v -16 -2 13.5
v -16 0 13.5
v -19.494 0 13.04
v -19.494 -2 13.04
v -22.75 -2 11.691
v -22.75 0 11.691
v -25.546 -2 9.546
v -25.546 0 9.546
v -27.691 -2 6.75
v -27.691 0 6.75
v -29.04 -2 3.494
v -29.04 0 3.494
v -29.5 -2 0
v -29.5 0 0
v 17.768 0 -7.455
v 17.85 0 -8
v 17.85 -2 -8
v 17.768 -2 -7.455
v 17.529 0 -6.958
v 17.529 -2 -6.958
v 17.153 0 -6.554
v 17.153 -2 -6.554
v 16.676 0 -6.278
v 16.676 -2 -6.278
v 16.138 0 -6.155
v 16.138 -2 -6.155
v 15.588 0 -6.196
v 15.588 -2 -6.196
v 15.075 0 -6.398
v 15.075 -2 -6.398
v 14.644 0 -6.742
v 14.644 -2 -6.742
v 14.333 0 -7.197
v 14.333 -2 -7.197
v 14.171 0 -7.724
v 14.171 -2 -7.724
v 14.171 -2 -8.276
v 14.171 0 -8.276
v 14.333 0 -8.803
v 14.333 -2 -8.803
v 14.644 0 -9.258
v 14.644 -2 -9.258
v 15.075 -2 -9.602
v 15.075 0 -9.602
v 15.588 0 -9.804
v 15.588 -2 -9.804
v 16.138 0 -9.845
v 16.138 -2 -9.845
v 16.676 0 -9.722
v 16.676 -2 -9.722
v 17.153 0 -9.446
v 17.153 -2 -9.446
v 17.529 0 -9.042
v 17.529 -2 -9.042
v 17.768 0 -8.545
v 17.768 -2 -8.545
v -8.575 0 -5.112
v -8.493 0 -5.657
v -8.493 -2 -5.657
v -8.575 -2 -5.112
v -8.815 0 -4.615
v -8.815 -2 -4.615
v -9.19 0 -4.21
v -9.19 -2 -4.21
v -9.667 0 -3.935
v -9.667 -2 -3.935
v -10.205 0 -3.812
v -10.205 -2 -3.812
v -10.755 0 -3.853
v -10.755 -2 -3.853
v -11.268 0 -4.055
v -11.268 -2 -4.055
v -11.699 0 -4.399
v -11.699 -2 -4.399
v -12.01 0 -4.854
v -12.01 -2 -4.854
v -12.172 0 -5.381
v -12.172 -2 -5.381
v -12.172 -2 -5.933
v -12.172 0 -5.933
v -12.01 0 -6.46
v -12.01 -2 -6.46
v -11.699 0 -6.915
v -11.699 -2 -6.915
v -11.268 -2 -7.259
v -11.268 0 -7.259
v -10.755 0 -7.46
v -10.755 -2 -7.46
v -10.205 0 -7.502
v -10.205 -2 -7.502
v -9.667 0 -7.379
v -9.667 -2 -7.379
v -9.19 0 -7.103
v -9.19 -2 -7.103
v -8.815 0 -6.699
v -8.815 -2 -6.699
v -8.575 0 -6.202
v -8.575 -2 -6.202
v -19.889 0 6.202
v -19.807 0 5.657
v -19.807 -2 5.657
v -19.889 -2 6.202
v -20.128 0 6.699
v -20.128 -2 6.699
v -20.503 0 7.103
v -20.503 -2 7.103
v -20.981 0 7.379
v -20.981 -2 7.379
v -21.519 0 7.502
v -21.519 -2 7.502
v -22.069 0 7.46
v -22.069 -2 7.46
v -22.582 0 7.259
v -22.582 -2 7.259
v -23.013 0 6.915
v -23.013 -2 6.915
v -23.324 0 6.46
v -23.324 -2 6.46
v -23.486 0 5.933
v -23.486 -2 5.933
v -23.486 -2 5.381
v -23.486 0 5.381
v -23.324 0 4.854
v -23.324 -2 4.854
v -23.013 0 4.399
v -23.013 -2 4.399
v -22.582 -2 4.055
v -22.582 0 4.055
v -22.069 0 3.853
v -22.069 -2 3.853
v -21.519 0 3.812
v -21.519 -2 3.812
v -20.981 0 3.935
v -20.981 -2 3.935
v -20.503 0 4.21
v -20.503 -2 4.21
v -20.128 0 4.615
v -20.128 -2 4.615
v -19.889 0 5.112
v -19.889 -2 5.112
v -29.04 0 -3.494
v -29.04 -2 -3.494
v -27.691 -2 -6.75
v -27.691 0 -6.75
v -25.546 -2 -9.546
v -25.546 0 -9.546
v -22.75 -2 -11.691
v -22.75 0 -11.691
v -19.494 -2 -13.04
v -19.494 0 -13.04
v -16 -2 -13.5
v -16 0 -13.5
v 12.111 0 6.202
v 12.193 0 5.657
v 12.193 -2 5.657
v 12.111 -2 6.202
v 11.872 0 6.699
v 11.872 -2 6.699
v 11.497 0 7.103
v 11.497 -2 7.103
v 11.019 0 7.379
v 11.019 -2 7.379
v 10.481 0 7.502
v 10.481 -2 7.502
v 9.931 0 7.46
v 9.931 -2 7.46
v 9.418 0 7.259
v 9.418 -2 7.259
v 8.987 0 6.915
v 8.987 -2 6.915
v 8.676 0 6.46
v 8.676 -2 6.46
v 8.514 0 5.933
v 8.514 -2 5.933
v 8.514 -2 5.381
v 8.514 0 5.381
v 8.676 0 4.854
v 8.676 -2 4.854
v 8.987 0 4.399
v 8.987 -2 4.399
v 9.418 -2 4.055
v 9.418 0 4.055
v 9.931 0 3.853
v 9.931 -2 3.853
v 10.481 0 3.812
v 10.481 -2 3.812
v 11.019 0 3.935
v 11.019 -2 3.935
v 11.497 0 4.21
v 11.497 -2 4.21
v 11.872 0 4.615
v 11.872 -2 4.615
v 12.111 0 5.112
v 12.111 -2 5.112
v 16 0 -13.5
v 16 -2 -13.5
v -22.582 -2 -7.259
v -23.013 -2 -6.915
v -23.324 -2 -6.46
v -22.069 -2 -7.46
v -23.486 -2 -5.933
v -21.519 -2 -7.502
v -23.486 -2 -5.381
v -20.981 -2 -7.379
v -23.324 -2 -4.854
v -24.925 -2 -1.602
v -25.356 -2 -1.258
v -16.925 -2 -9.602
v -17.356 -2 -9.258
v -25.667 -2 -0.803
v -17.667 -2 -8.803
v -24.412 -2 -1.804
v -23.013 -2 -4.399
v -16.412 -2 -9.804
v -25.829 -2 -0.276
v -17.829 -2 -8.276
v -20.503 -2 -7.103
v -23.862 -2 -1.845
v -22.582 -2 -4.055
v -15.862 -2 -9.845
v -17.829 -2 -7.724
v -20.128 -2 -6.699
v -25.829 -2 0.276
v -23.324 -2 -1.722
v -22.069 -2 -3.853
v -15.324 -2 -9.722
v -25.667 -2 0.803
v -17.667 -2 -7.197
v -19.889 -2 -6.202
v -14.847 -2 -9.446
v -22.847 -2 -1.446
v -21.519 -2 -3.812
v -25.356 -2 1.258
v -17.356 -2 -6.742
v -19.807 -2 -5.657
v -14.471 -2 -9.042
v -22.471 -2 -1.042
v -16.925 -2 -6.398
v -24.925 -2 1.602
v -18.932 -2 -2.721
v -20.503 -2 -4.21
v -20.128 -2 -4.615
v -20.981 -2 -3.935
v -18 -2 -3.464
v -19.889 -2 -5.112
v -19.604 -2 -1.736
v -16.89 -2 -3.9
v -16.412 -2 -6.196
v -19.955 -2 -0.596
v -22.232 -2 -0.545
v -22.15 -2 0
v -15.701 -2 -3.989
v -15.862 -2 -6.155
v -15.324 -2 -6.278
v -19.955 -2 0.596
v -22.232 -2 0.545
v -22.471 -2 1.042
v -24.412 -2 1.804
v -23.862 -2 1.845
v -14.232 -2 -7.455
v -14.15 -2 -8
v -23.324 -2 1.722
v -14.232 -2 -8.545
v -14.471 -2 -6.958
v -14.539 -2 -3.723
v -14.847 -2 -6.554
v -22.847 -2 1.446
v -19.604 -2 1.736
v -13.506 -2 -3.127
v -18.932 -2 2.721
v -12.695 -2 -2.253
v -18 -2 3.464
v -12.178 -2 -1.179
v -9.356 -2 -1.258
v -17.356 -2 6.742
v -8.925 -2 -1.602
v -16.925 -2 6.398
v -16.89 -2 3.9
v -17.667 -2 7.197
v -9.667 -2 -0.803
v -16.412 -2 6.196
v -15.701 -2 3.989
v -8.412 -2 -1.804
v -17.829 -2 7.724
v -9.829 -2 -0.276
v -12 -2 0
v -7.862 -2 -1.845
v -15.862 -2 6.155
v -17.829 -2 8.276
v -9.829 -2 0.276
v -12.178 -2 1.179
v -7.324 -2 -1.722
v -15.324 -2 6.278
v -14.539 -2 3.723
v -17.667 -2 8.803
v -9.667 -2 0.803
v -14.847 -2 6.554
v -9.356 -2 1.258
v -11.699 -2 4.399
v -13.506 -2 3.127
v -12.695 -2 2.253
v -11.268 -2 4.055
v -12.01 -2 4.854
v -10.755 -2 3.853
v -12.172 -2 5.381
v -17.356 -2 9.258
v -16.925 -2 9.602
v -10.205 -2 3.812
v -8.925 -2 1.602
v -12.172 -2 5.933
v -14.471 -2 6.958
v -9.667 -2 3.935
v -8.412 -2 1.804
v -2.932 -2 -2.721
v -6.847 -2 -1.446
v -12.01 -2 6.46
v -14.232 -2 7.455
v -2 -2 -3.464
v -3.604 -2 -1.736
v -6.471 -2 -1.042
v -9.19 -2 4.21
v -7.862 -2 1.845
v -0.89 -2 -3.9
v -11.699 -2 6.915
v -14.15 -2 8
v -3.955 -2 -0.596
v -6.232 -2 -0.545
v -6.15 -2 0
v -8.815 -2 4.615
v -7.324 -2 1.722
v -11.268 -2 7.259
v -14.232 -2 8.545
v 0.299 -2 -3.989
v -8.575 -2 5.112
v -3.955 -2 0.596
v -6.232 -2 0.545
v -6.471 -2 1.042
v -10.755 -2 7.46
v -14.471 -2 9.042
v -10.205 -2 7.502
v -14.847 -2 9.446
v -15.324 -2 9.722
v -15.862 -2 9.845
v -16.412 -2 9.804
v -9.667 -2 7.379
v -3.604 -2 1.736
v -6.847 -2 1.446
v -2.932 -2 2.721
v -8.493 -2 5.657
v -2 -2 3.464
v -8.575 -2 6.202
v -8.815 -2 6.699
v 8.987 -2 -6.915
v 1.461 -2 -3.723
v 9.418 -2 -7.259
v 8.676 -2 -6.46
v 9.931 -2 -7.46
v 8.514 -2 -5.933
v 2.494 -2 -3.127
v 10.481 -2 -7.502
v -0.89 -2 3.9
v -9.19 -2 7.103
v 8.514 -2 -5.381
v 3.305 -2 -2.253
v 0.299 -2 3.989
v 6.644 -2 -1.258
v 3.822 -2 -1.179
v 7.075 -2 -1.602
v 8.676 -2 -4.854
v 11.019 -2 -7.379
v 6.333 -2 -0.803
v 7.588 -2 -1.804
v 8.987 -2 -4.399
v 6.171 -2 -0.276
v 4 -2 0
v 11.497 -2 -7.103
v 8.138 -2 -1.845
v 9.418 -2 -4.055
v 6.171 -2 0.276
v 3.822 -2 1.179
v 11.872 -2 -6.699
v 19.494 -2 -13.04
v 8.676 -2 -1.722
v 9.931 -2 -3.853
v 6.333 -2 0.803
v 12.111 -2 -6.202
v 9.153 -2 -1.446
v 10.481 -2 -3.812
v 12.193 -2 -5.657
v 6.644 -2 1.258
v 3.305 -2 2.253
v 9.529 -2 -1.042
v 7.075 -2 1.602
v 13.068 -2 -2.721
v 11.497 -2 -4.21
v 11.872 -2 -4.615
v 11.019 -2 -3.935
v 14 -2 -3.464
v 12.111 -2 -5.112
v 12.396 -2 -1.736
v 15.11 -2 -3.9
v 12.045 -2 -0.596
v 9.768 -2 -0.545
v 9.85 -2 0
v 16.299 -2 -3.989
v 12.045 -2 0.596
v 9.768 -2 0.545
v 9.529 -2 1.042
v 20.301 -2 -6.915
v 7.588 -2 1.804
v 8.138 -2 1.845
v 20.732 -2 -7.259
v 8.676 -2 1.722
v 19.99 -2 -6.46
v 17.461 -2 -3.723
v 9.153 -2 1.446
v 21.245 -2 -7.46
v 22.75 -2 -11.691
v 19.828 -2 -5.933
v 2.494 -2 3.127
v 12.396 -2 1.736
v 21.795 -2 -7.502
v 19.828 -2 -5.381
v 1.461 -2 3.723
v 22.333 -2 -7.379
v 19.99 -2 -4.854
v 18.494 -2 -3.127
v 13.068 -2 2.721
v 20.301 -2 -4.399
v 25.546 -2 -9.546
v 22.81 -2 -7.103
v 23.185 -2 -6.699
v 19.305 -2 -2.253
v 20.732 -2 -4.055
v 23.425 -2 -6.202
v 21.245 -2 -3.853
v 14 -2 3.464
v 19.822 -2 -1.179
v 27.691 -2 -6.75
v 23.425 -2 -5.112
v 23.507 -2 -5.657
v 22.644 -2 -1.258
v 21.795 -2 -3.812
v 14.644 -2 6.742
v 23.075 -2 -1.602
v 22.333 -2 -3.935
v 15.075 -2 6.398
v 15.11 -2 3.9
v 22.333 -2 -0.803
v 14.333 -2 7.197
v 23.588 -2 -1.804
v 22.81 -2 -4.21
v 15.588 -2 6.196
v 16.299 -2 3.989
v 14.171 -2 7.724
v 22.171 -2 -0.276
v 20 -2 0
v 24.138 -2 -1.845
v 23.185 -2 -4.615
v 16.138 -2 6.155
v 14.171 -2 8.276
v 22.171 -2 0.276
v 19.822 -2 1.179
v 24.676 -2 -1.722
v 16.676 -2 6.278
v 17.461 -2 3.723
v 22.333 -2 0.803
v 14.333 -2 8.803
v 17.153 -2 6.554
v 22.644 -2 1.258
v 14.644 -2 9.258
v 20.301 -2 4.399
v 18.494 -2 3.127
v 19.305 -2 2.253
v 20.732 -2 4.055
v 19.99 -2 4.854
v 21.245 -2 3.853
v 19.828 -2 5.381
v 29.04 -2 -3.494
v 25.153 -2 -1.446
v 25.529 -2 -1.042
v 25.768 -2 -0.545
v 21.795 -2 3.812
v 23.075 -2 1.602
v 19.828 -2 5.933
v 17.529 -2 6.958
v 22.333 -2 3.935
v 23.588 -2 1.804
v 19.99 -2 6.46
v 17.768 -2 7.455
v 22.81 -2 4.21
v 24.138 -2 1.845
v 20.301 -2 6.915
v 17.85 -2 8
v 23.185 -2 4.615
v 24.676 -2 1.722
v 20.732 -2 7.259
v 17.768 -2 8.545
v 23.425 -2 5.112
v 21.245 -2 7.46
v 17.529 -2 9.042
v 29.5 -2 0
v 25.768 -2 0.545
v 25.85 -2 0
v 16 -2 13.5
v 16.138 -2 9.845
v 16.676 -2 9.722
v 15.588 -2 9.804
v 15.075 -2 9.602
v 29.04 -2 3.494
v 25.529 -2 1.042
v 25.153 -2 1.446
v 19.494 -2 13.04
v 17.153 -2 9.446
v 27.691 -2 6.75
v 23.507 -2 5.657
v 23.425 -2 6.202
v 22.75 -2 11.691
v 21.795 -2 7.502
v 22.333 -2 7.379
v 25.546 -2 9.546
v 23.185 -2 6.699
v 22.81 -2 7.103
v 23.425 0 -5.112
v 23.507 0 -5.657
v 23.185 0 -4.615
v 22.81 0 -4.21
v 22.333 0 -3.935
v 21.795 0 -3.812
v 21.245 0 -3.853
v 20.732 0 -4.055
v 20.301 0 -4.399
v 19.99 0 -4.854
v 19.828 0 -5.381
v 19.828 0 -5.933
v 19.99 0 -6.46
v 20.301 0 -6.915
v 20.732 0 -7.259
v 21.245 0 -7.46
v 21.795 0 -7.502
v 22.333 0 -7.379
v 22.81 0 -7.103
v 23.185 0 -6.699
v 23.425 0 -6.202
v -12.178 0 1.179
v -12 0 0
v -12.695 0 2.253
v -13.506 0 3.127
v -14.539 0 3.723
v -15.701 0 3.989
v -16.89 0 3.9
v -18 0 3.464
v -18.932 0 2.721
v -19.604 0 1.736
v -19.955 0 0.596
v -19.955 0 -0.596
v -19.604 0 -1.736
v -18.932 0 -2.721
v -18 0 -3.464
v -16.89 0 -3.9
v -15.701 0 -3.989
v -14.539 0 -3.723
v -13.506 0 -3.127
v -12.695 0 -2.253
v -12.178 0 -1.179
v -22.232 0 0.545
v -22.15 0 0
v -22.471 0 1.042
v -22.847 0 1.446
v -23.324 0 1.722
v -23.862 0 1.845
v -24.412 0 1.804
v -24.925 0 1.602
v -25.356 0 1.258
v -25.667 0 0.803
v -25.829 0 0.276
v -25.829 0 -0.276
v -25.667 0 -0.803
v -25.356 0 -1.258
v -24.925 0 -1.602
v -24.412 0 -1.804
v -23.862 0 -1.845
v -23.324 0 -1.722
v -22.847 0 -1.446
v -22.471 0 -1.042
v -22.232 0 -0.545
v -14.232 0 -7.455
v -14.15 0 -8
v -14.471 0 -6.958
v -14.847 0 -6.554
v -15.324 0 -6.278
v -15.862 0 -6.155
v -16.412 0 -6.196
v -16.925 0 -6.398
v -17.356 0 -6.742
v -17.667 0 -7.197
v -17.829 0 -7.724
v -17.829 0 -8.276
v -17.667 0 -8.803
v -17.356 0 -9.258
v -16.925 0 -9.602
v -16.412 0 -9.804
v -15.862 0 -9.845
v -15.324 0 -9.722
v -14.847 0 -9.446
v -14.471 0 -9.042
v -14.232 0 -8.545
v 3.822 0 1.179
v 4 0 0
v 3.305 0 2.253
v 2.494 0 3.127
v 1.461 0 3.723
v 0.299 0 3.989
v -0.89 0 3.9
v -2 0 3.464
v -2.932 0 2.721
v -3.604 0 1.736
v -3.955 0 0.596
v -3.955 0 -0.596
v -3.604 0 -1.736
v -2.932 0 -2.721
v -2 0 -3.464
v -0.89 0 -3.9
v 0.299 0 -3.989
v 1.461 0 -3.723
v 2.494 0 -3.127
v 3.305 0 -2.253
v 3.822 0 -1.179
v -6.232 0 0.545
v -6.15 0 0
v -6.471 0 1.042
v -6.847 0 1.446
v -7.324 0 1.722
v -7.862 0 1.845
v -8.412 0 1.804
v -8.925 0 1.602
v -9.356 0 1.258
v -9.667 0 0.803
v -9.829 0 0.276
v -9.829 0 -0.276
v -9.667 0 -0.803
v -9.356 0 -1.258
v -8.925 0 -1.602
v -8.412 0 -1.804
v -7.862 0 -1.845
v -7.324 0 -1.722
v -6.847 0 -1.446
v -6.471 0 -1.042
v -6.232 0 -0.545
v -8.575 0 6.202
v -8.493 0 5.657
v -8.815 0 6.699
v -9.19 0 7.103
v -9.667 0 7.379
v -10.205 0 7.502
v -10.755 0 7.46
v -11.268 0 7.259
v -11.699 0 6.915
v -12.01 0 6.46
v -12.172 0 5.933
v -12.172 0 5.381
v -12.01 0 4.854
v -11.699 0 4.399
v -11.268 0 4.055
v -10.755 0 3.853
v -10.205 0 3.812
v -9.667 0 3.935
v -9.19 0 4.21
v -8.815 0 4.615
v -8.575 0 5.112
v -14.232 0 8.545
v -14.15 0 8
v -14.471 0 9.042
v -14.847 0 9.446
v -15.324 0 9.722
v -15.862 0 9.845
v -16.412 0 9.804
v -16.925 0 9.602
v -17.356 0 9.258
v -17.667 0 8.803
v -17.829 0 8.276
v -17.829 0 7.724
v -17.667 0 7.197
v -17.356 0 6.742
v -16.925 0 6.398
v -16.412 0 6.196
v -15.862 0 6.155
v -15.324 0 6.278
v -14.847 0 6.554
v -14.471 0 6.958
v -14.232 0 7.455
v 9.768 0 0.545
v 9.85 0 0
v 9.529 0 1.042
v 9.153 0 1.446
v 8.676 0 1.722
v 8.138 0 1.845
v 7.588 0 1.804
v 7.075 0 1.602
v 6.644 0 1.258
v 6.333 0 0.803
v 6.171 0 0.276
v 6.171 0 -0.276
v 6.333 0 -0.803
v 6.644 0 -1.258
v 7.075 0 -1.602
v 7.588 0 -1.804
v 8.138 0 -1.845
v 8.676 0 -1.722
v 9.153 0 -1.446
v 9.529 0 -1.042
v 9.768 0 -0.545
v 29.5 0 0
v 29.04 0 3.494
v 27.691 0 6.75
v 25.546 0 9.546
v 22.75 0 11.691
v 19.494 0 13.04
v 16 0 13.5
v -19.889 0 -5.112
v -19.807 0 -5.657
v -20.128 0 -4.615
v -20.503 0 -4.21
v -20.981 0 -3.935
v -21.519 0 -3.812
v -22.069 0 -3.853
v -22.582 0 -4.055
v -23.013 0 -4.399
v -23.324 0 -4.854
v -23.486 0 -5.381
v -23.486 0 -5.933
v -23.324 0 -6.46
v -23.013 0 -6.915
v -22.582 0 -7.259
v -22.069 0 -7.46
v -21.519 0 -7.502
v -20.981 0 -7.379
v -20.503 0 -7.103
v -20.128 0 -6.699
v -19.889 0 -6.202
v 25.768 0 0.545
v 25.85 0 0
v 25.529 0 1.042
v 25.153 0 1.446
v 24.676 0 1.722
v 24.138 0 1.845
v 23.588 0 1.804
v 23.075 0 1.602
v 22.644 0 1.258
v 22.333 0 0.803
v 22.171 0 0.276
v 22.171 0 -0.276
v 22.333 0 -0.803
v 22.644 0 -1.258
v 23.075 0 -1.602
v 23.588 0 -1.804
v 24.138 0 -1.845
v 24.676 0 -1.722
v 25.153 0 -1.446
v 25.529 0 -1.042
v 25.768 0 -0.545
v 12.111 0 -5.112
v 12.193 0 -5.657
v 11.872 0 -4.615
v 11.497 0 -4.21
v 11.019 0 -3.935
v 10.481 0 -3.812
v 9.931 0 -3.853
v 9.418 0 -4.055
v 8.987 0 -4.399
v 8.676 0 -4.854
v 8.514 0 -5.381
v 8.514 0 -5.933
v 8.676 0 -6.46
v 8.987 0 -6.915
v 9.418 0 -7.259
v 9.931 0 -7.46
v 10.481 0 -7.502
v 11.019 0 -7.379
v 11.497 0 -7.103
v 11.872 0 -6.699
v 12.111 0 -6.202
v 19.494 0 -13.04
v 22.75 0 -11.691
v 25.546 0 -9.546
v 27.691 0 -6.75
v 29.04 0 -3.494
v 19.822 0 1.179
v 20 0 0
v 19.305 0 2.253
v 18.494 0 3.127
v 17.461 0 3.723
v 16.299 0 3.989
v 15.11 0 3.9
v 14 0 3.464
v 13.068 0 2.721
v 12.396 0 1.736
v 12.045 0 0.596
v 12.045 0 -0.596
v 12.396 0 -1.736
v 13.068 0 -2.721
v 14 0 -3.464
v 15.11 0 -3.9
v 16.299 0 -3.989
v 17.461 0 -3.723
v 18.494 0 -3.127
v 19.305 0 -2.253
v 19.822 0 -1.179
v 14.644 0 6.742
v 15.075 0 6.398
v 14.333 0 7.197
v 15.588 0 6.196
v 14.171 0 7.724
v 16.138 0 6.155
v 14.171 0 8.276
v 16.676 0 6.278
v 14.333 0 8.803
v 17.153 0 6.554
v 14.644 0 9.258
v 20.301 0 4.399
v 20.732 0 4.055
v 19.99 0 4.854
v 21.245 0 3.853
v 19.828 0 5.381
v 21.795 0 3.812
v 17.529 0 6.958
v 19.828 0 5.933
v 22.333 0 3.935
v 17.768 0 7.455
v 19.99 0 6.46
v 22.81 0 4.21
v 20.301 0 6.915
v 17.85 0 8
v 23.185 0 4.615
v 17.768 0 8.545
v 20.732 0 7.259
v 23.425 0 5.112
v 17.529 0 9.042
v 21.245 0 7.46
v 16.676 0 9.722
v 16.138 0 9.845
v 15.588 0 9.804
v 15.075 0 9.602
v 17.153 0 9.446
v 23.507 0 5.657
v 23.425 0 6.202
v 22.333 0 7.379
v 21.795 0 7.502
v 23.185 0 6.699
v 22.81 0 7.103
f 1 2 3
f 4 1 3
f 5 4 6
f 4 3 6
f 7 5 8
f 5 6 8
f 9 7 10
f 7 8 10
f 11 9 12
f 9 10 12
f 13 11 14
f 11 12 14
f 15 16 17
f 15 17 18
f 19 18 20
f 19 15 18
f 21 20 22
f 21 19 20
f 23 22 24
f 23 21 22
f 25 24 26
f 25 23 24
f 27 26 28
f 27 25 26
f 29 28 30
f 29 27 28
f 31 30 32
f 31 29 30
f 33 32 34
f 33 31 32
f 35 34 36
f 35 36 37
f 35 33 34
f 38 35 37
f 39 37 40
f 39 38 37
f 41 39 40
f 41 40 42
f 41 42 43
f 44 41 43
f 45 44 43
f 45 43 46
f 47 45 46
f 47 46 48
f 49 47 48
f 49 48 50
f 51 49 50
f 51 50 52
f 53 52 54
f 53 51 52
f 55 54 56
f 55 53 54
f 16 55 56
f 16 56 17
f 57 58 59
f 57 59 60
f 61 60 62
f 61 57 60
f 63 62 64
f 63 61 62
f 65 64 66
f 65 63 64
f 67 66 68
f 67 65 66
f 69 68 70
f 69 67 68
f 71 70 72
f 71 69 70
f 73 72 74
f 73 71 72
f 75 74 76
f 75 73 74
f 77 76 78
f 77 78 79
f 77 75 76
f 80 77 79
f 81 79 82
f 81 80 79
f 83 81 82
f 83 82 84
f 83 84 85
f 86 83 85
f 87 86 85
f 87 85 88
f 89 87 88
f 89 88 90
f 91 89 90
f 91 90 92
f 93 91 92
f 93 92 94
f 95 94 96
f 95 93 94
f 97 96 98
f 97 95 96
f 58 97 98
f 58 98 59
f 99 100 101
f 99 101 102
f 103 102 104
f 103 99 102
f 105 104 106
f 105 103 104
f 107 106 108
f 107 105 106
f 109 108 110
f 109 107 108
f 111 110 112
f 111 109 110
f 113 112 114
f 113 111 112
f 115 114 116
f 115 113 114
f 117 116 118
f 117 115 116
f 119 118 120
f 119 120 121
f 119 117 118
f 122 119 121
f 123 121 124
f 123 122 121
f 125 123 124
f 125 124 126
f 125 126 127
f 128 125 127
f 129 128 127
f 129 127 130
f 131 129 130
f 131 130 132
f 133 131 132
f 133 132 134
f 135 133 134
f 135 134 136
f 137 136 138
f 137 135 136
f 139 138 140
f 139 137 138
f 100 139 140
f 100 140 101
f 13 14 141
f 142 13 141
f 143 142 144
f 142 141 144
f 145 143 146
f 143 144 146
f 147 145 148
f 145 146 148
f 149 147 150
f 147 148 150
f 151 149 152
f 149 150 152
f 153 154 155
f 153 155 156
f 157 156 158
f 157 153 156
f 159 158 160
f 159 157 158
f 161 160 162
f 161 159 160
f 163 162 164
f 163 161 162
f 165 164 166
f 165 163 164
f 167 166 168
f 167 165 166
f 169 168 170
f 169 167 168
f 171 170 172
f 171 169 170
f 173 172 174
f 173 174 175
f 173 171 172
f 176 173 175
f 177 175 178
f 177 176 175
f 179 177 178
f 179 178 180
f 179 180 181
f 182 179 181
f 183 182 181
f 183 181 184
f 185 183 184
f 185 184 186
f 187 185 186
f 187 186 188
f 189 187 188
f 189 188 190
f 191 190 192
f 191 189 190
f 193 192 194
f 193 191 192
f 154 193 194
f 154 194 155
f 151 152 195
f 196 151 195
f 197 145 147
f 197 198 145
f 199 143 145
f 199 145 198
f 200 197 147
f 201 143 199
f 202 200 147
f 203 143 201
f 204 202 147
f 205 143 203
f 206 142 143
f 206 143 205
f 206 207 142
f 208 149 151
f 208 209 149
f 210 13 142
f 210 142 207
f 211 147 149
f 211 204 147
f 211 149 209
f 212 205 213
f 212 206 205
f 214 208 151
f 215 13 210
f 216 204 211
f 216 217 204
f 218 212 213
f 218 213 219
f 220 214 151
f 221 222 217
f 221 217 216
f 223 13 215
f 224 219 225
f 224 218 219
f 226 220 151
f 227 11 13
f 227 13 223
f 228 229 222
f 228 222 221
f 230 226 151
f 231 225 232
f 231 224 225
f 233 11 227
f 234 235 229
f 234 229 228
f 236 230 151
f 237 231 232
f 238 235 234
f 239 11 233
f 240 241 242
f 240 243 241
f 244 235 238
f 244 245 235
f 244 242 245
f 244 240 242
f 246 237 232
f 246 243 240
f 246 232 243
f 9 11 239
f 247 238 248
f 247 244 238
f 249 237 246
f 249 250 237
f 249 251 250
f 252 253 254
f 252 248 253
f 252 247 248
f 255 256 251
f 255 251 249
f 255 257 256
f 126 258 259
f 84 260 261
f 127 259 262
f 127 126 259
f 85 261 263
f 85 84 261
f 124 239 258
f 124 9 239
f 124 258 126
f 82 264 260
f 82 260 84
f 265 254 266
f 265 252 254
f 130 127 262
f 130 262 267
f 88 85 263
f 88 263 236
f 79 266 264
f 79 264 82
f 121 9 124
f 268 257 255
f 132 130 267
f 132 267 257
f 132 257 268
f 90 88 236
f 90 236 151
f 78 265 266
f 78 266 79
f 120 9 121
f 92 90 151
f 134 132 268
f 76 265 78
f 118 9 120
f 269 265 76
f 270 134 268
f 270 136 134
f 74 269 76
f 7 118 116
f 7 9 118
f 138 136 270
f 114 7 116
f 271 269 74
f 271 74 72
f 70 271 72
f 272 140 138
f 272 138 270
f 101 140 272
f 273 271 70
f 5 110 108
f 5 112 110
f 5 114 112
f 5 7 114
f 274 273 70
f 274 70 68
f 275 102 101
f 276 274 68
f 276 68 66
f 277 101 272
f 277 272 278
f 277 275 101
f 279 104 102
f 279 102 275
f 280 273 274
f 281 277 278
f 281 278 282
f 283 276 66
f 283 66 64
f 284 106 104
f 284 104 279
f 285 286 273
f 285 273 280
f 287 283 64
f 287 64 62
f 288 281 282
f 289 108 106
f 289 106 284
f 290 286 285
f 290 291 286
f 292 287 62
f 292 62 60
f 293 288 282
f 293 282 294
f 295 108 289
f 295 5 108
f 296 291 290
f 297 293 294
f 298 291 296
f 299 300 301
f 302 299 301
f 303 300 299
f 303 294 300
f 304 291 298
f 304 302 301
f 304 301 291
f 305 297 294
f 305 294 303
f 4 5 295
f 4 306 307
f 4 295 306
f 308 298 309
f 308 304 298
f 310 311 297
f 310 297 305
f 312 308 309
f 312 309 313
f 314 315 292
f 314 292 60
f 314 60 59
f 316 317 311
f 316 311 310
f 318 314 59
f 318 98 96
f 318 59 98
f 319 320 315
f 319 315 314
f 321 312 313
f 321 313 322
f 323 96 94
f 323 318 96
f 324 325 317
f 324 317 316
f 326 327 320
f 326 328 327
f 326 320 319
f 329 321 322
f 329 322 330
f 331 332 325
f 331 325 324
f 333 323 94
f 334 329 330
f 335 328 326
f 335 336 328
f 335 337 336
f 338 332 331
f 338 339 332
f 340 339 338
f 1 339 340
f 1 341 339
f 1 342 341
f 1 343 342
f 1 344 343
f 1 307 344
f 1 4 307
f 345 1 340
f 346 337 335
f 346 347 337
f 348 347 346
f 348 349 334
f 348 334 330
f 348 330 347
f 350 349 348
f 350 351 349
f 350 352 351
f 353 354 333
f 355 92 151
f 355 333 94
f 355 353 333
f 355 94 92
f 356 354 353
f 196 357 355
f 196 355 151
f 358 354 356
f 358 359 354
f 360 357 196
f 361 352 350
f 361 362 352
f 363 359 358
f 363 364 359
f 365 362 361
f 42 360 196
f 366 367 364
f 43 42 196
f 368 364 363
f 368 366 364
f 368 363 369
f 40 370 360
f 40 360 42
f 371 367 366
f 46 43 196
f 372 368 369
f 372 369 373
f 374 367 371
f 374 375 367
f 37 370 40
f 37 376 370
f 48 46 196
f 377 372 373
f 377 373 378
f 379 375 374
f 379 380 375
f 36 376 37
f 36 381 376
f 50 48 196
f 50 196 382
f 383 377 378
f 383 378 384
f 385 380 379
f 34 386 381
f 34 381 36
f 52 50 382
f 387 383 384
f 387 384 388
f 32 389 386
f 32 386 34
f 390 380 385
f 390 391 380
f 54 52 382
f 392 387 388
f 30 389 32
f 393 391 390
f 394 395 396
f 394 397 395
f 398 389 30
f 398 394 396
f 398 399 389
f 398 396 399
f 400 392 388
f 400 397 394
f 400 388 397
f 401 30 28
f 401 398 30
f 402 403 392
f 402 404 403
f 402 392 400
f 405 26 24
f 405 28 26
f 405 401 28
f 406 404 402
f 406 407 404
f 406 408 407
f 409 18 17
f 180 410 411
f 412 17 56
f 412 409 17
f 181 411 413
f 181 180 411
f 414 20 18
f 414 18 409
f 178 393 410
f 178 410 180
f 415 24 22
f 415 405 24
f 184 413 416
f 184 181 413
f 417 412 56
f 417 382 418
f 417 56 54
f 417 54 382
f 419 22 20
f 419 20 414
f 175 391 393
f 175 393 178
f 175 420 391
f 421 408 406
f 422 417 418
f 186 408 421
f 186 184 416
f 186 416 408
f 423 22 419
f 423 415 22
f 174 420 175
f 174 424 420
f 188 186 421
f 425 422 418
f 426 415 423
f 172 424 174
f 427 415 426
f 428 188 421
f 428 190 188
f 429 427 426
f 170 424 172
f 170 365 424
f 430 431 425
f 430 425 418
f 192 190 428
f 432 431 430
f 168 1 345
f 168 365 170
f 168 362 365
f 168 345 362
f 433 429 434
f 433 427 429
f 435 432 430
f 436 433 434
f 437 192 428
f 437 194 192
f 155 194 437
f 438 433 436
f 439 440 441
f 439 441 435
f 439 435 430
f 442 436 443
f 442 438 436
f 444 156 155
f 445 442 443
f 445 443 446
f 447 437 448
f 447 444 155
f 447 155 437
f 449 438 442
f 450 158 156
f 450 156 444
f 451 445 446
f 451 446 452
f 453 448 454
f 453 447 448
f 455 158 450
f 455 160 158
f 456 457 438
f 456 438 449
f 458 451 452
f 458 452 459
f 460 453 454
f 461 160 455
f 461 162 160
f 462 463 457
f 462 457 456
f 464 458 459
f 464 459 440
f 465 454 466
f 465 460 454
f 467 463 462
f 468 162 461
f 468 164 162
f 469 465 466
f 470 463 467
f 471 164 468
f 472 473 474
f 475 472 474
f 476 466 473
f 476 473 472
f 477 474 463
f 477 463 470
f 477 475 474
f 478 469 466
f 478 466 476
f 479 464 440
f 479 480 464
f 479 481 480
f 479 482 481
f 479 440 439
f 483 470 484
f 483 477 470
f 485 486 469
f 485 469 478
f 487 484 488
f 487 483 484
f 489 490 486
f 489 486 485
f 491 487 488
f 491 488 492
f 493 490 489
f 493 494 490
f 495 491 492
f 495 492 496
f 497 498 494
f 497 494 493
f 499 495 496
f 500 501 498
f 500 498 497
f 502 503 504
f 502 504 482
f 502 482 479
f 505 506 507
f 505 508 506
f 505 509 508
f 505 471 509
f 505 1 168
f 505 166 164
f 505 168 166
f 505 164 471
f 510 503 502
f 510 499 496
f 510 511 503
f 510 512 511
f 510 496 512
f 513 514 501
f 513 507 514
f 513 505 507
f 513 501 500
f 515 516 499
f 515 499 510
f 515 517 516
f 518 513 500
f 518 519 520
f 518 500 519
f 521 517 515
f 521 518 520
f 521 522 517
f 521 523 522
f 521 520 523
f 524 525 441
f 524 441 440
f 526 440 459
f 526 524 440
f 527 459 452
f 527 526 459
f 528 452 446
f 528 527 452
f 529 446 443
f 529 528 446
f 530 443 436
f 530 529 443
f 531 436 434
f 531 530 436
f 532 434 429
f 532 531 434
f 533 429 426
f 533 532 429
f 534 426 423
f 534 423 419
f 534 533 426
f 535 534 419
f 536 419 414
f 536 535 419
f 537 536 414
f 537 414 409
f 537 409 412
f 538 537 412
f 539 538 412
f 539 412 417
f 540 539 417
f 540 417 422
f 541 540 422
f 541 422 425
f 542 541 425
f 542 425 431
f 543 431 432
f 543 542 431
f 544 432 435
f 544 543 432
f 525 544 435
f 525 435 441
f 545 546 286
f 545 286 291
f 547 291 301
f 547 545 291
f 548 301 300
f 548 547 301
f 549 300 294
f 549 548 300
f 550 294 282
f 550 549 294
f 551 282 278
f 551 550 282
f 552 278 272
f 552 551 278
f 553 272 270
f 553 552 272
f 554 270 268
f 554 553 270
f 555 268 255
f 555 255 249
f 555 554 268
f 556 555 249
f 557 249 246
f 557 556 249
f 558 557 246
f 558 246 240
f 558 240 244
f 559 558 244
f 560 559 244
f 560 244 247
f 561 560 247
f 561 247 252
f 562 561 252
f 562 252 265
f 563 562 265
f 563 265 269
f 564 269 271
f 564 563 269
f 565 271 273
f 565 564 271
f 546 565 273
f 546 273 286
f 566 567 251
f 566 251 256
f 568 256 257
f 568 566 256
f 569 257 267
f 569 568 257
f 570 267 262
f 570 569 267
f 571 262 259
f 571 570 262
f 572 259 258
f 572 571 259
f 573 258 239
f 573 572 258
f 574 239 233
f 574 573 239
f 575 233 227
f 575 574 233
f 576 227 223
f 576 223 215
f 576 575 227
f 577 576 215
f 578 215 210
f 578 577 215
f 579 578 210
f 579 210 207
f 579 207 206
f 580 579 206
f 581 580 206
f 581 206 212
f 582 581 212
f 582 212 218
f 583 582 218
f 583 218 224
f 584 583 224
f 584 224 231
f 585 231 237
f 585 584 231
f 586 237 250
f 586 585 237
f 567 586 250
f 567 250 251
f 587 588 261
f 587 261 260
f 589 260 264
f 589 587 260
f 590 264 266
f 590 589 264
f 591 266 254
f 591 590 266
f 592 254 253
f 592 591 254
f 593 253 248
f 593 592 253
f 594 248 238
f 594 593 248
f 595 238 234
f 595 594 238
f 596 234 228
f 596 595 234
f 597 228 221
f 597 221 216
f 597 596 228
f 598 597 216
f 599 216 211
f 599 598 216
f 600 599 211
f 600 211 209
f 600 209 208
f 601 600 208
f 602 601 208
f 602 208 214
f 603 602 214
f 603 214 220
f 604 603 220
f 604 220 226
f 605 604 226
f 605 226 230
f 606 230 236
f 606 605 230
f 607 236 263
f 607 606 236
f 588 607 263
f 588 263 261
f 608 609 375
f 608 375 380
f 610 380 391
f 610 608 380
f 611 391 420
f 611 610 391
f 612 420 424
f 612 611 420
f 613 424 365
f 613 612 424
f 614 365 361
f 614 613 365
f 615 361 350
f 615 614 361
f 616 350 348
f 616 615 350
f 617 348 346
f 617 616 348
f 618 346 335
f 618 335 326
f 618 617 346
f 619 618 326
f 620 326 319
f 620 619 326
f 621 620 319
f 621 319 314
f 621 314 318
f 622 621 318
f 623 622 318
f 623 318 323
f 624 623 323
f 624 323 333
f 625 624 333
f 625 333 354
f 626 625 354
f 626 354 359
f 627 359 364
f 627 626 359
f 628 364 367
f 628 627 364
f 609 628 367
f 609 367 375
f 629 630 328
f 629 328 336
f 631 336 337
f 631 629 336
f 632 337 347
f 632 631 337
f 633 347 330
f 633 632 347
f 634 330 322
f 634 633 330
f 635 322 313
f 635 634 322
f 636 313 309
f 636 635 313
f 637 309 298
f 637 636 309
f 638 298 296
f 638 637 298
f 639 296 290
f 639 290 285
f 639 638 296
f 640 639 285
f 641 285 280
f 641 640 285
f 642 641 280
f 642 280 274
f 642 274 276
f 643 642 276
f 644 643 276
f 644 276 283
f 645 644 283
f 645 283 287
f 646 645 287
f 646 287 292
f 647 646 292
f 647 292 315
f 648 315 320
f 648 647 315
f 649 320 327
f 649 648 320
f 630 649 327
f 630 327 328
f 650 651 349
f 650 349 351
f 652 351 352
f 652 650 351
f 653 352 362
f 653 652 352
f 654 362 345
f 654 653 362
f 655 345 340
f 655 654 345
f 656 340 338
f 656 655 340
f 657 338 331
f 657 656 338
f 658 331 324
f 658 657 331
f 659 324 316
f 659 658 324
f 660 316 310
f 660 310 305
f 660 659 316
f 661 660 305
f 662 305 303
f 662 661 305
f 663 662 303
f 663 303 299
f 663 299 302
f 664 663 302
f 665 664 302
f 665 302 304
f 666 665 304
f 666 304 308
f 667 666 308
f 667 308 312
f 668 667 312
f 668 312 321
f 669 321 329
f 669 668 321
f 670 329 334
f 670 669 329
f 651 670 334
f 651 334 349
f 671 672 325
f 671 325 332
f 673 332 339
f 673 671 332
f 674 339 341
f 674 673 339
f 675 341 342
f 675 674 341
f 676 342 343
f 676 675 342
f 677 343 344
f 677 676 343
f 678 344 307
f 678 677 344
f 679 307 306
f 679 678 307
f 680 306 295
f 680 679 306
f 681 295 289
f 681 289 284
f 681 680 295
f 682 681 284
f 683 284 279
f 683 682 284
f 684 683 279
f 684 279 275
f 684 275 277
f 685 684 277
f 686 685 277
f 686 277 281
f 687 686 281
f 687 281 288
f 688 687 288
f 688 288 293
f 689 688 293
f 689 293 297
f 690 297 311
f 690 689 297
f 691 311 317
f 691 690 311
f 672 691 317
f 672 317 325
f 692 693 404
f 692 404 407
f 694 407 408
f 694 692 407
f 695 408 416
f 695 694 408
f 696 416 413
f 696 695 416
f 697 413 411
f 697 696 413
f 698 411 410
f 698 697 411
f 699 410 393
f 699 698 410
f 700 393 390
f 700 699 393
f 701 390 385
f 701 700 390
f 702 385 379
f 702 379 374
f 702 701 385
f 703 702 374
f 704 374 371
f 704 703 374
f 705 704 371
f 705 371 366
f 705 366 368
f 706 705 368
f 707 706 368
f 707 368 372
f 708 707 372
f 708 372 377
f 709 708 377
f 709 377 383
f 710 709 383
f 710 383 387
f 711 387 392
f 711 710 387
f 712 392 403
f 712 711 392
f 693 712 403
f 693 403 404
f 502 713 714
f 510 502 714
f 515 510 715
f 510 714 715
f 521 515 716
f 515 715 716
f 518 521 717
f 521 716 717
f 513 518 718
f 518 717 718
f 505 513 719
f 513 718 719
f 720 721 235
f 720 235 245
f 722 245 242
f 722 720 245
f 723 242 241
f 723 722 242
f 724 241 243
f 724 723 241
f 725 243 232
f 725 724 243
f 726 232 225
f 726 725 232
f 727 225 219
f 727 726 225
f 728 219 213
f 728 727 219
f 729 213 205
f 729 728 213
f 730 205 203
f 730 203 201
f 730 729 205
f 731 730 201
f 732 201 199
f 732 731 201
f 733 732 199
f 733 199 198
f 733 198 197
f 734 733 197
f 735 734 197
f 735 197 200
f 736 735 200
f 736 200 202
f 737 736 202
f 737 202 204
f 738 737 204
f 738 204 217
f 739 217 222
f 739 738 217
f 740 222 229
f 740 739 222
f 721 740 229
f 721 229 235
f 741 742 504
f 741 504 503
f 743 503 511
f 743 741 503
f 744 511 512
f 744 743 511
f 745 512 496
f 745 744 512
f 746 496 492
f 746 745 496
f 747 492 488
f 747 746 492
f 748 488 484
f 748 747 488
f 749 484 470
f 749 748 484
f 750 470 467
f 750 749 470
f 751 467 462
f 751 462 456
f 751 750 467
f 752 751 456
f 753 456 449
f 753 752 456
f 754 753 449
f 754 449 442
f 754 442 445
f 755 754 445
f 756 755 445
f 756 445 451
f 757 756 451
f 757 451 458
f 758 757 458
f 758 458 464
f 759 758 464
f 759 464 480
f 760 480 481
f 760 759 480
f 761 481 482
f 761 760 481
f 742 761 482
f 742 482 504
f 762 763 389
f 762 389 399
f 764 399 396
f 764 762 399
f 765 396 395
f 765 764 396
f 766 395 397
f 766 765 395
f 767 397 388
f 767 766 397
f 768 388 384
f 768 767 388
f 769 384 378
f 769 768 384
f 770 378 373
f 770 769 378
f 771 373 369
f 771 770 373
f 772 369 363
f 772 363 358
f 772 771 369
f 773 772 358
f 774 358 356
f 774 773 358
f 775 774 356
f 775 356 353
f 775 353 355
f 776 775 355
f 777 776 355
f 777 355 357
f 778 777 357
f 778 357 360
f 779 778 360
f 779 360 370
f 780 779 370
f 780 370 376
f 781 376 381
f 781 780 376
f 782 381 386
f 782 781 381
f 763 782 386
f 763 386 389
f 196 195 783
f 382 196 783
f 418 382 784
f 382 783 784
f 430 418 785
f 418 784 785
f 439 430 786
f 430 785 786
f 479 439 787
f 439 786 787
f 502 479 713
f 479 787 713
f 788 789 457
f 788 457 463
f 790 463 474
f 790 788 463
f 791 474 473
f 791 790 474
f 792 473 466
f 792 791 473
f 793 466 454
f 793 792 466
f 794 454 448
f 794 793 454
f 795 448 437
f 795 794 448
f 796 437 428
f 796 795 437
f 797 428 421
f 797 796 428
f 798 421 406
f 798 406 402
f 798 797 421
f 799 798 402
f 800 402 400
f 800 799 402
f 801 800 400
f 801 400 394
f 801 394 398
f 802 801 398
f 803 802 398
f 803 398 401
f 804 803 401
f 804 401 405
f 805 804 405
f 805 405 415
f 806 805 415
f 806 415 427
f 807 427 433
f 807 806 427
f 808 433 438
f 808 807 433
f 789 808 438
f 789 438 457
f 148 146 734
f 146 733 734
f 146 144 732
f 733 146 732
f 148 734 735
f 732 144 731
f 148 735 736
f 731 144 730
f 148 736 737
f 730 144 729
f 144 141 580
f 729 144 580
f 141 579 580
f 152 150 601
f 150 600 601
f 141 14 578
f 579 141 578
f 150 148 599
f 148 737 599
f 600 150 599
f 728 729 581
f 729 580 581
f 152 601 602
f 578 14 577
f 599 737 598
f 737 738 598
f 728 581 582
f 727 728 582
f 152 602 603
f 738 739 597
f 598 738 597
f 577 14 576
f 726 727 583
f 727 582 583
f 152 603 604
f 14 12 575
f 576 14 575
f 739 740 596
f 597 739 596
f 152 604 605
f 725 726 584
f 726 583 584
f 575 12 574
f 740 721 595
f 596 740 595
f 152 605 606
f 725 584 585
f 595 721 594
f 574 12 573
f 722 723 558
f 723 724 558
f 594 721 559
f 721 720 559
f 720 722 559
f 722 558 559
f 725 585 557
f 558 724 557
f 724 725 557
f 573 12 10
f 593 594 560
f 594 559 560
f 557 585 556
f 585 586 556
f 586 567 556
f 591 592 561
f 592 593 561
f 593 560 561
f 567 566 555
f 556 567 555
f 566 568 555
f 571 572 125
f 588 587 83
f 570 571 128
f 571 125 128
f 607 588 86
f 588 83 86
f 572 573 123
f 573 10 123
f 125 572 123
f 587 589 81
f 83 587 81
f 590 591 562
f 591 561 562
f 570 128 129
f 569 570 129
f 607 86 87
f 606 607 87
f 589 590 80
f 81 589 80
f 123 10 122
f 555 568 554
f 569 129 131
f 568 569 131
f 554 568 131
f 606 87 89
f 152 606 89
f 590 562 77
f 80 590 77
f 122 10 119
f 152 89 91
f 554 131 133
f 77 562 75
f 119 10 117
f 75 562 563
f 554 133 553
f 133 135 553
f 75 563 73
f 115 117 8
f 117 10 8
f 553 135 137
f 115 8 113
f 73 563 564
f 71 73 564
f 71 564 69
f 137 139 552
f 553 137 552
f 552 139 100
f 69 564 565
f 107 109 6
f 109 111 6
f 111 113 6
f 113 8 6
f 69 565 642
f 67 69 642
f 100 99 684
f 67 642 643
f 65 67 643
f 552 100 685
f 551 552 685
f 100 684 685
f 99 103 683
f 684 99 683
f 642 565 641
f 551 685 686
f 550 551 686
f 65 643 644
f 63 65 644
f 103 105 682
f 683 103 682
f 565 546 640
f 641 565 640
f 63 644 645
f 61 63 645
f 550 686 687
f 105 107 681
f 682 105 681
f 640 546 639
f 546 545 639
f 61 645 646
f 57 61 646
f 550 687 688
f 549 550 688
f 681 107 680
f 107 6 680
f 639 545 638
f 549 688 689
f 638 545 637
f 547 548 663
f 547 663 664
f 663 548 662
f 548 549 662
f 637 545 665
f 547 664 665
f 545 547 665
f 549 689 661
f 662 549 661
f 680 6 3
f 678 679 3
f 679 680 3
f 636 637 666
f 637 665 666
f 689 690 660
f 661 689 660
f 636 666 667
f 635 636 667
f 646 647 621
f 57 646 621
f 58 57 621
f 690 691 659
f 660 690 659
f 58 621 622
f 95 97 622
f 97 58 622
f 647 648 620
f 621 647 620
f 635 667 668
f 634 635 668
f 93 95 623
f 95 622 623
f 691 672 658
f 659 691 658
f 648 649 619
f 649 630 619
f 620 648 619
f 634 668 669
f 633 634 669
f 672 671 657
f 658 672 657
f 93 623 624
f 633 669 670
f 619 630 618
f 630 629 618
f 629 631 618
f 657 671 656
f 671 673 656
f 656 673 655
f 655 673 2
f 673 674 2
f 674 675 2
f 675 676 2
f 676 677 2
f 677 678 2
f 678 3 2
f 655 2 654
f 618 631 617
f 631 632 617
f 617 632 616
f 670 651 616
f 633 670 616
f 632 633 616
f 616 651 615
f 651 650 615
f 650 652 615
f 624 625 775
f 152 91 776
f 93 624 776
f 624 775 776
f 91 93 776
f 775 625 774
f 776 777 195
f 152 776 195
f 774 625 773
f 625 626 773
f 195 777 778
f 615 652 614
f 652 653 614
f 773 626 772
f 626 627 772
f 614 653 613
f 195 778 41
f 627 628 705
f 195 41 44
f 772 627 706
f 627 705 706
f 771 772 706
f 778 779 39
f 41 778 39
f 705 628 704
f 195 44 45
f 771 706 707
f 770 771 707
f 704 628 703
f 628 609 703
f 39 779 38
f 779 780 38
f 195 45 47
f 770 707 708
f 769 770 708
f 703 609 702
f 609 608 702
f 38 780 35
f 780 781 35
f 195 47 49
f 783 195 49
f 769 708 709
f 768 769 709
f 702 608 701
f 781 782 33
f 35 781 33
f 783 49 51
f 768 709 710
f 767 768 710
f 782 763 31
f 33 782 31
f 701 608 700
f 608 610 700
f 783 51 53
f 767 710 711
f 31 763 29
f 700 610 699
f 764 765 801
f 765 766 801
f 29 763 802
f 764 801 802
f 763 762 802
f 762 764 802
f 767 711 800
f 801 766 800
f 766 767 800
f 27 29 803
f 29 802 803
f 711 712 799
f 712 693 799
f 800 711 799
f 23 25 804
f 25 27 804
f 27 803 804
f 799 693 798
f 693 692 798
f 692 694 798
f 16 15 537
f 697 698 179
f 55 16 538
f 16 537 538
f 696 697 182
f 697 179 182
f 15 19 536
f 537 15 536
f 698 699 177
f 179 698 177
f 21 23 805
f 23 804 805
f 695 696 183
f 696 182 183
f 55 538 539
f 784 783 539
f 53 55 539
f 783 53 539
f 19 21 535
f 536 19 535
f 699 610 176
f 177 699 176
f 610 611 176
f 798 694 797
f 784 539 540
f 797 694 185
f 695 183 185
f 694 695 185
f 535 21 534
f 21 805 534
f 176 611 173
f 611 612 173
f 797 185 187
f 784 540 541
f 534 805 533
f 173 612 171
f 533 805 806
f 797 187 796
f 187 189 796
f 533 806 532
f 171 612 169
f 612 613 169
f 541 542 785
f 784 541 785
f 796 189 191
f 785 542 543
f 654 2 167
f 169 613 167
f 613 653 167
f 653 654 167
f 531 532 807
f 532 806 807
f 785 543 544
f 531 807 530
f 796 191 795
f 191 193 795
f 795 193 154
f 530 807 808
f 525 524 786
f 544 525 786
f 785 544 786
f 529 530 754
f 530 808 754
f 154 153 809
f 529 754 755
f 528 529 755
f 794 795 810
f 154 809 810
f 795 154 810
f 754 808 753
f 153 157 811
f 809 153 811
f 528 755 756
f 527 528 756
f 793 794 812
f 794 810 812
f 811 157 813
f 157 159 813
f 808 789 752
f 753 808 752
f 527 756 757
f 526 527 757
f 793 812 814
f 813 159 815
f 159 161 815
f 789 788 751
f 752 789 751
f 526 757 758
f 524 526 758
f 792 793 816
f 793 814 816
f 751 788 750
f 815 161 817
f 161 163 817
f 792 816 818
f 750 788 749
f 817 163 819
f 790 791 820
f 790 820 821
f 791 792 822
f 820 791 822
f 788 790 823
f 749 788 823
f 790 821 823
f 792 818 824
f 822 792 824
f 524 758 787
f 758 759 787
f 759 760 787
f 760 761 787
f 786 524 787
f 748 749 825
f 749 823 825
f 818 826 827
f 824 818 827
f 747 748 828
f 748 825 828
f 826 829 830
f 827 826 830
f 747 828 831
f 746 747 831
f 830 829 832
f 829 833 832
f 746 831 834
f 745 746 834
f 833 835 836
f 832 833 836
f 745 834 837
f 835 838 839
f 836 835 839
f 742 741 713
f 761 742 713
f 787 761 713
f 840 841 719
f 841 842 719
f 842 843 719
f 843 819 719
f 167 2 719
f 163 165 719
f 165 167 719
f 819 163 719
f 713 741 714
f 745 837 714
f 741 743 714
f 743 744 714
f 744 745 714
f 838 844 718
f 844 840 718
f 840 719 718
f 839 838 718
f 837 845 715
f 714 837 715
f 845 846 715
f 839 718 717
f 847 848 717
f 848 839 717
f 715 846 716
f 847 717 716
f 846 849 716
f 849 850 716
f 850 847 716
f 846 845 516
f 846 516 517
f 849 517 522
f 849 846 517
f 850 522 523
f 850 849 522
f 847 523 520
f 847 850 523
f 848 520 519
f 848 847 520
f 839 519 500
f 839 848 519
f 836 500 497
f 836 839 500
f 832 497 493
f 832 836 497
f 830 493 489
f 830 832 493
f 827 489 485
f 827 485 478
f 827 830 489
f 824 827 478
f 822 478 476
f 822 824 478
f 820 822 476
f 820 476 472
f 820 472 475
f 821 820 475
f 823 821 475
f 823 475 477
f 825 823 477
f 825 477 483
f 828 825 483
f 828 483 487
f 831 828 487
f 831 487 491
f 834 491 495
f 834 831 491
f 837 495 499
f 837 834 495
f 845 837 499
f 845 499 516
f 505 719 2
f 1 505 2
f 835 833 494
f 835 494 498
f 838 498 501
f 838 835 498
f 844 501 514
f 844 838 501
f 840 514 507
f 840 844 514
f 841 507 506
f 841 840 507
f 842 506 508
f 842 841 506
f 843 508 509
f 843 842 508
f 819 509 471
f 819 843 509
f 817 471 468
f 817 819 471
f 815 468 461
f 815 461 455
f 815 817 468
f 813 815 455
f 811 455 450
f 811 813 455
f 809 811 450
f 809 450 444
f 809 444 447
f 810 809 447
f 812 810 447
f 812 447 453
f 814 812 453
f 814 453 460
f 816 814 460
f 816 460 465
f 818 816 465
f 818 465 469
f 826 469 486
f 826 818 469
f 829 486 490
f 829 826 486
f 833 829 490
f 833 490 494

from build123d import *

# Parameters (mm, degrees)
F0_R     = 1.85
F0_R_2   = 4
F1_DEPTH = 2


with BuildPart() as f1:
    # F0 (on Front) → F1 (new body)
    with BuildSketch(Plane.XZ):
        with BuildLine():
            ThreePointArc((29.5, 0), (25.545942, 9.545942), (16, 13.5))
            Line((16, 13.5), (-16, 13.5))
            ThreePointArc((-16, 13.5), (-25.545942, 9.545942), (-29.5, 0))
            ThreePointArc((-29.5, 0), (-25.545942, -9.545942), (-16, -13.5))
            Line((-16, -13.5), (16, -13.5))
            ThreePointArc((16, -13.5), (25.545942, -9.545942), (29.5, 0))
        make_face()
        with Locations((-16, -8)):
            Circle(F0_R, mode=Mode.SUBTRACT)
        with Locations((-21.656854, -5.656854)):
            Circle(F0_R, mode=Mode.SUBTRACT)
        with Locations((-10.343146, -5.656854)):
            Circle(F0_R, mode=Mode.SUBTRACT)
        with Locations((16, -8)):
            Circle(F0_R, mode=Mode.SUBTRACT)
        with Locations((10.343146, -5.656854)):
            Circle(F0_R, mode=Mode.SUBTRACT)
        with Locations((21.656854, -5.656854)):
            Circle(F0_R, mode=Mode.SUBTRACT)
        with Locations((-24, 0)):
            Circle(F0_R, mode=Mode.SUBTRACT)
        with Locations((-16, 0)):
            Circle(F0_R_2, mode=Mode.SUBTRACT)
        with Locations((-21.656854, 5.656854)):
            Circle(F0_R, mode=Mode.SUBTRACT)
        with Locations((-8, 0)):
            Circle(F0_R, mode=Mode.SUBTRACT)
        with Locations((-10.343146, 5.656854)):
            Circle(F0_R, mode=Mode.SUBTRACT)
        with Locations((-16, 8)):
            Circle(F0_R, mode=Mode.SUBTRACT)
        Circle(F0_R_2, mode=Mode.SUBTRACT)
        with Locations((8, 0)):
            Circle(F0_R, mode=Mode.SUBTRACT)
        with Locations((10.343146, 5.656854)):
            Circle(F0_R, mode=Mode.SUBTRACT)
        with Locations((16, 0)):
            Circle(F0_R_2, mode=Mode.SUBTRACT)
        with Locations((24, 0)):
            Circle(F0_R, mode=Mode.SUBTRACT)
        with Locations((21.656854, 5.656854)):
            Circle(F0_R, mode=Mode.SUBTRACT)
        with Locations((16, 8)):
            Circle(F0_R, mode=Mode.SUBTRACT)
    extrude(amount=F1_DEPTH)


solid = f1.part
